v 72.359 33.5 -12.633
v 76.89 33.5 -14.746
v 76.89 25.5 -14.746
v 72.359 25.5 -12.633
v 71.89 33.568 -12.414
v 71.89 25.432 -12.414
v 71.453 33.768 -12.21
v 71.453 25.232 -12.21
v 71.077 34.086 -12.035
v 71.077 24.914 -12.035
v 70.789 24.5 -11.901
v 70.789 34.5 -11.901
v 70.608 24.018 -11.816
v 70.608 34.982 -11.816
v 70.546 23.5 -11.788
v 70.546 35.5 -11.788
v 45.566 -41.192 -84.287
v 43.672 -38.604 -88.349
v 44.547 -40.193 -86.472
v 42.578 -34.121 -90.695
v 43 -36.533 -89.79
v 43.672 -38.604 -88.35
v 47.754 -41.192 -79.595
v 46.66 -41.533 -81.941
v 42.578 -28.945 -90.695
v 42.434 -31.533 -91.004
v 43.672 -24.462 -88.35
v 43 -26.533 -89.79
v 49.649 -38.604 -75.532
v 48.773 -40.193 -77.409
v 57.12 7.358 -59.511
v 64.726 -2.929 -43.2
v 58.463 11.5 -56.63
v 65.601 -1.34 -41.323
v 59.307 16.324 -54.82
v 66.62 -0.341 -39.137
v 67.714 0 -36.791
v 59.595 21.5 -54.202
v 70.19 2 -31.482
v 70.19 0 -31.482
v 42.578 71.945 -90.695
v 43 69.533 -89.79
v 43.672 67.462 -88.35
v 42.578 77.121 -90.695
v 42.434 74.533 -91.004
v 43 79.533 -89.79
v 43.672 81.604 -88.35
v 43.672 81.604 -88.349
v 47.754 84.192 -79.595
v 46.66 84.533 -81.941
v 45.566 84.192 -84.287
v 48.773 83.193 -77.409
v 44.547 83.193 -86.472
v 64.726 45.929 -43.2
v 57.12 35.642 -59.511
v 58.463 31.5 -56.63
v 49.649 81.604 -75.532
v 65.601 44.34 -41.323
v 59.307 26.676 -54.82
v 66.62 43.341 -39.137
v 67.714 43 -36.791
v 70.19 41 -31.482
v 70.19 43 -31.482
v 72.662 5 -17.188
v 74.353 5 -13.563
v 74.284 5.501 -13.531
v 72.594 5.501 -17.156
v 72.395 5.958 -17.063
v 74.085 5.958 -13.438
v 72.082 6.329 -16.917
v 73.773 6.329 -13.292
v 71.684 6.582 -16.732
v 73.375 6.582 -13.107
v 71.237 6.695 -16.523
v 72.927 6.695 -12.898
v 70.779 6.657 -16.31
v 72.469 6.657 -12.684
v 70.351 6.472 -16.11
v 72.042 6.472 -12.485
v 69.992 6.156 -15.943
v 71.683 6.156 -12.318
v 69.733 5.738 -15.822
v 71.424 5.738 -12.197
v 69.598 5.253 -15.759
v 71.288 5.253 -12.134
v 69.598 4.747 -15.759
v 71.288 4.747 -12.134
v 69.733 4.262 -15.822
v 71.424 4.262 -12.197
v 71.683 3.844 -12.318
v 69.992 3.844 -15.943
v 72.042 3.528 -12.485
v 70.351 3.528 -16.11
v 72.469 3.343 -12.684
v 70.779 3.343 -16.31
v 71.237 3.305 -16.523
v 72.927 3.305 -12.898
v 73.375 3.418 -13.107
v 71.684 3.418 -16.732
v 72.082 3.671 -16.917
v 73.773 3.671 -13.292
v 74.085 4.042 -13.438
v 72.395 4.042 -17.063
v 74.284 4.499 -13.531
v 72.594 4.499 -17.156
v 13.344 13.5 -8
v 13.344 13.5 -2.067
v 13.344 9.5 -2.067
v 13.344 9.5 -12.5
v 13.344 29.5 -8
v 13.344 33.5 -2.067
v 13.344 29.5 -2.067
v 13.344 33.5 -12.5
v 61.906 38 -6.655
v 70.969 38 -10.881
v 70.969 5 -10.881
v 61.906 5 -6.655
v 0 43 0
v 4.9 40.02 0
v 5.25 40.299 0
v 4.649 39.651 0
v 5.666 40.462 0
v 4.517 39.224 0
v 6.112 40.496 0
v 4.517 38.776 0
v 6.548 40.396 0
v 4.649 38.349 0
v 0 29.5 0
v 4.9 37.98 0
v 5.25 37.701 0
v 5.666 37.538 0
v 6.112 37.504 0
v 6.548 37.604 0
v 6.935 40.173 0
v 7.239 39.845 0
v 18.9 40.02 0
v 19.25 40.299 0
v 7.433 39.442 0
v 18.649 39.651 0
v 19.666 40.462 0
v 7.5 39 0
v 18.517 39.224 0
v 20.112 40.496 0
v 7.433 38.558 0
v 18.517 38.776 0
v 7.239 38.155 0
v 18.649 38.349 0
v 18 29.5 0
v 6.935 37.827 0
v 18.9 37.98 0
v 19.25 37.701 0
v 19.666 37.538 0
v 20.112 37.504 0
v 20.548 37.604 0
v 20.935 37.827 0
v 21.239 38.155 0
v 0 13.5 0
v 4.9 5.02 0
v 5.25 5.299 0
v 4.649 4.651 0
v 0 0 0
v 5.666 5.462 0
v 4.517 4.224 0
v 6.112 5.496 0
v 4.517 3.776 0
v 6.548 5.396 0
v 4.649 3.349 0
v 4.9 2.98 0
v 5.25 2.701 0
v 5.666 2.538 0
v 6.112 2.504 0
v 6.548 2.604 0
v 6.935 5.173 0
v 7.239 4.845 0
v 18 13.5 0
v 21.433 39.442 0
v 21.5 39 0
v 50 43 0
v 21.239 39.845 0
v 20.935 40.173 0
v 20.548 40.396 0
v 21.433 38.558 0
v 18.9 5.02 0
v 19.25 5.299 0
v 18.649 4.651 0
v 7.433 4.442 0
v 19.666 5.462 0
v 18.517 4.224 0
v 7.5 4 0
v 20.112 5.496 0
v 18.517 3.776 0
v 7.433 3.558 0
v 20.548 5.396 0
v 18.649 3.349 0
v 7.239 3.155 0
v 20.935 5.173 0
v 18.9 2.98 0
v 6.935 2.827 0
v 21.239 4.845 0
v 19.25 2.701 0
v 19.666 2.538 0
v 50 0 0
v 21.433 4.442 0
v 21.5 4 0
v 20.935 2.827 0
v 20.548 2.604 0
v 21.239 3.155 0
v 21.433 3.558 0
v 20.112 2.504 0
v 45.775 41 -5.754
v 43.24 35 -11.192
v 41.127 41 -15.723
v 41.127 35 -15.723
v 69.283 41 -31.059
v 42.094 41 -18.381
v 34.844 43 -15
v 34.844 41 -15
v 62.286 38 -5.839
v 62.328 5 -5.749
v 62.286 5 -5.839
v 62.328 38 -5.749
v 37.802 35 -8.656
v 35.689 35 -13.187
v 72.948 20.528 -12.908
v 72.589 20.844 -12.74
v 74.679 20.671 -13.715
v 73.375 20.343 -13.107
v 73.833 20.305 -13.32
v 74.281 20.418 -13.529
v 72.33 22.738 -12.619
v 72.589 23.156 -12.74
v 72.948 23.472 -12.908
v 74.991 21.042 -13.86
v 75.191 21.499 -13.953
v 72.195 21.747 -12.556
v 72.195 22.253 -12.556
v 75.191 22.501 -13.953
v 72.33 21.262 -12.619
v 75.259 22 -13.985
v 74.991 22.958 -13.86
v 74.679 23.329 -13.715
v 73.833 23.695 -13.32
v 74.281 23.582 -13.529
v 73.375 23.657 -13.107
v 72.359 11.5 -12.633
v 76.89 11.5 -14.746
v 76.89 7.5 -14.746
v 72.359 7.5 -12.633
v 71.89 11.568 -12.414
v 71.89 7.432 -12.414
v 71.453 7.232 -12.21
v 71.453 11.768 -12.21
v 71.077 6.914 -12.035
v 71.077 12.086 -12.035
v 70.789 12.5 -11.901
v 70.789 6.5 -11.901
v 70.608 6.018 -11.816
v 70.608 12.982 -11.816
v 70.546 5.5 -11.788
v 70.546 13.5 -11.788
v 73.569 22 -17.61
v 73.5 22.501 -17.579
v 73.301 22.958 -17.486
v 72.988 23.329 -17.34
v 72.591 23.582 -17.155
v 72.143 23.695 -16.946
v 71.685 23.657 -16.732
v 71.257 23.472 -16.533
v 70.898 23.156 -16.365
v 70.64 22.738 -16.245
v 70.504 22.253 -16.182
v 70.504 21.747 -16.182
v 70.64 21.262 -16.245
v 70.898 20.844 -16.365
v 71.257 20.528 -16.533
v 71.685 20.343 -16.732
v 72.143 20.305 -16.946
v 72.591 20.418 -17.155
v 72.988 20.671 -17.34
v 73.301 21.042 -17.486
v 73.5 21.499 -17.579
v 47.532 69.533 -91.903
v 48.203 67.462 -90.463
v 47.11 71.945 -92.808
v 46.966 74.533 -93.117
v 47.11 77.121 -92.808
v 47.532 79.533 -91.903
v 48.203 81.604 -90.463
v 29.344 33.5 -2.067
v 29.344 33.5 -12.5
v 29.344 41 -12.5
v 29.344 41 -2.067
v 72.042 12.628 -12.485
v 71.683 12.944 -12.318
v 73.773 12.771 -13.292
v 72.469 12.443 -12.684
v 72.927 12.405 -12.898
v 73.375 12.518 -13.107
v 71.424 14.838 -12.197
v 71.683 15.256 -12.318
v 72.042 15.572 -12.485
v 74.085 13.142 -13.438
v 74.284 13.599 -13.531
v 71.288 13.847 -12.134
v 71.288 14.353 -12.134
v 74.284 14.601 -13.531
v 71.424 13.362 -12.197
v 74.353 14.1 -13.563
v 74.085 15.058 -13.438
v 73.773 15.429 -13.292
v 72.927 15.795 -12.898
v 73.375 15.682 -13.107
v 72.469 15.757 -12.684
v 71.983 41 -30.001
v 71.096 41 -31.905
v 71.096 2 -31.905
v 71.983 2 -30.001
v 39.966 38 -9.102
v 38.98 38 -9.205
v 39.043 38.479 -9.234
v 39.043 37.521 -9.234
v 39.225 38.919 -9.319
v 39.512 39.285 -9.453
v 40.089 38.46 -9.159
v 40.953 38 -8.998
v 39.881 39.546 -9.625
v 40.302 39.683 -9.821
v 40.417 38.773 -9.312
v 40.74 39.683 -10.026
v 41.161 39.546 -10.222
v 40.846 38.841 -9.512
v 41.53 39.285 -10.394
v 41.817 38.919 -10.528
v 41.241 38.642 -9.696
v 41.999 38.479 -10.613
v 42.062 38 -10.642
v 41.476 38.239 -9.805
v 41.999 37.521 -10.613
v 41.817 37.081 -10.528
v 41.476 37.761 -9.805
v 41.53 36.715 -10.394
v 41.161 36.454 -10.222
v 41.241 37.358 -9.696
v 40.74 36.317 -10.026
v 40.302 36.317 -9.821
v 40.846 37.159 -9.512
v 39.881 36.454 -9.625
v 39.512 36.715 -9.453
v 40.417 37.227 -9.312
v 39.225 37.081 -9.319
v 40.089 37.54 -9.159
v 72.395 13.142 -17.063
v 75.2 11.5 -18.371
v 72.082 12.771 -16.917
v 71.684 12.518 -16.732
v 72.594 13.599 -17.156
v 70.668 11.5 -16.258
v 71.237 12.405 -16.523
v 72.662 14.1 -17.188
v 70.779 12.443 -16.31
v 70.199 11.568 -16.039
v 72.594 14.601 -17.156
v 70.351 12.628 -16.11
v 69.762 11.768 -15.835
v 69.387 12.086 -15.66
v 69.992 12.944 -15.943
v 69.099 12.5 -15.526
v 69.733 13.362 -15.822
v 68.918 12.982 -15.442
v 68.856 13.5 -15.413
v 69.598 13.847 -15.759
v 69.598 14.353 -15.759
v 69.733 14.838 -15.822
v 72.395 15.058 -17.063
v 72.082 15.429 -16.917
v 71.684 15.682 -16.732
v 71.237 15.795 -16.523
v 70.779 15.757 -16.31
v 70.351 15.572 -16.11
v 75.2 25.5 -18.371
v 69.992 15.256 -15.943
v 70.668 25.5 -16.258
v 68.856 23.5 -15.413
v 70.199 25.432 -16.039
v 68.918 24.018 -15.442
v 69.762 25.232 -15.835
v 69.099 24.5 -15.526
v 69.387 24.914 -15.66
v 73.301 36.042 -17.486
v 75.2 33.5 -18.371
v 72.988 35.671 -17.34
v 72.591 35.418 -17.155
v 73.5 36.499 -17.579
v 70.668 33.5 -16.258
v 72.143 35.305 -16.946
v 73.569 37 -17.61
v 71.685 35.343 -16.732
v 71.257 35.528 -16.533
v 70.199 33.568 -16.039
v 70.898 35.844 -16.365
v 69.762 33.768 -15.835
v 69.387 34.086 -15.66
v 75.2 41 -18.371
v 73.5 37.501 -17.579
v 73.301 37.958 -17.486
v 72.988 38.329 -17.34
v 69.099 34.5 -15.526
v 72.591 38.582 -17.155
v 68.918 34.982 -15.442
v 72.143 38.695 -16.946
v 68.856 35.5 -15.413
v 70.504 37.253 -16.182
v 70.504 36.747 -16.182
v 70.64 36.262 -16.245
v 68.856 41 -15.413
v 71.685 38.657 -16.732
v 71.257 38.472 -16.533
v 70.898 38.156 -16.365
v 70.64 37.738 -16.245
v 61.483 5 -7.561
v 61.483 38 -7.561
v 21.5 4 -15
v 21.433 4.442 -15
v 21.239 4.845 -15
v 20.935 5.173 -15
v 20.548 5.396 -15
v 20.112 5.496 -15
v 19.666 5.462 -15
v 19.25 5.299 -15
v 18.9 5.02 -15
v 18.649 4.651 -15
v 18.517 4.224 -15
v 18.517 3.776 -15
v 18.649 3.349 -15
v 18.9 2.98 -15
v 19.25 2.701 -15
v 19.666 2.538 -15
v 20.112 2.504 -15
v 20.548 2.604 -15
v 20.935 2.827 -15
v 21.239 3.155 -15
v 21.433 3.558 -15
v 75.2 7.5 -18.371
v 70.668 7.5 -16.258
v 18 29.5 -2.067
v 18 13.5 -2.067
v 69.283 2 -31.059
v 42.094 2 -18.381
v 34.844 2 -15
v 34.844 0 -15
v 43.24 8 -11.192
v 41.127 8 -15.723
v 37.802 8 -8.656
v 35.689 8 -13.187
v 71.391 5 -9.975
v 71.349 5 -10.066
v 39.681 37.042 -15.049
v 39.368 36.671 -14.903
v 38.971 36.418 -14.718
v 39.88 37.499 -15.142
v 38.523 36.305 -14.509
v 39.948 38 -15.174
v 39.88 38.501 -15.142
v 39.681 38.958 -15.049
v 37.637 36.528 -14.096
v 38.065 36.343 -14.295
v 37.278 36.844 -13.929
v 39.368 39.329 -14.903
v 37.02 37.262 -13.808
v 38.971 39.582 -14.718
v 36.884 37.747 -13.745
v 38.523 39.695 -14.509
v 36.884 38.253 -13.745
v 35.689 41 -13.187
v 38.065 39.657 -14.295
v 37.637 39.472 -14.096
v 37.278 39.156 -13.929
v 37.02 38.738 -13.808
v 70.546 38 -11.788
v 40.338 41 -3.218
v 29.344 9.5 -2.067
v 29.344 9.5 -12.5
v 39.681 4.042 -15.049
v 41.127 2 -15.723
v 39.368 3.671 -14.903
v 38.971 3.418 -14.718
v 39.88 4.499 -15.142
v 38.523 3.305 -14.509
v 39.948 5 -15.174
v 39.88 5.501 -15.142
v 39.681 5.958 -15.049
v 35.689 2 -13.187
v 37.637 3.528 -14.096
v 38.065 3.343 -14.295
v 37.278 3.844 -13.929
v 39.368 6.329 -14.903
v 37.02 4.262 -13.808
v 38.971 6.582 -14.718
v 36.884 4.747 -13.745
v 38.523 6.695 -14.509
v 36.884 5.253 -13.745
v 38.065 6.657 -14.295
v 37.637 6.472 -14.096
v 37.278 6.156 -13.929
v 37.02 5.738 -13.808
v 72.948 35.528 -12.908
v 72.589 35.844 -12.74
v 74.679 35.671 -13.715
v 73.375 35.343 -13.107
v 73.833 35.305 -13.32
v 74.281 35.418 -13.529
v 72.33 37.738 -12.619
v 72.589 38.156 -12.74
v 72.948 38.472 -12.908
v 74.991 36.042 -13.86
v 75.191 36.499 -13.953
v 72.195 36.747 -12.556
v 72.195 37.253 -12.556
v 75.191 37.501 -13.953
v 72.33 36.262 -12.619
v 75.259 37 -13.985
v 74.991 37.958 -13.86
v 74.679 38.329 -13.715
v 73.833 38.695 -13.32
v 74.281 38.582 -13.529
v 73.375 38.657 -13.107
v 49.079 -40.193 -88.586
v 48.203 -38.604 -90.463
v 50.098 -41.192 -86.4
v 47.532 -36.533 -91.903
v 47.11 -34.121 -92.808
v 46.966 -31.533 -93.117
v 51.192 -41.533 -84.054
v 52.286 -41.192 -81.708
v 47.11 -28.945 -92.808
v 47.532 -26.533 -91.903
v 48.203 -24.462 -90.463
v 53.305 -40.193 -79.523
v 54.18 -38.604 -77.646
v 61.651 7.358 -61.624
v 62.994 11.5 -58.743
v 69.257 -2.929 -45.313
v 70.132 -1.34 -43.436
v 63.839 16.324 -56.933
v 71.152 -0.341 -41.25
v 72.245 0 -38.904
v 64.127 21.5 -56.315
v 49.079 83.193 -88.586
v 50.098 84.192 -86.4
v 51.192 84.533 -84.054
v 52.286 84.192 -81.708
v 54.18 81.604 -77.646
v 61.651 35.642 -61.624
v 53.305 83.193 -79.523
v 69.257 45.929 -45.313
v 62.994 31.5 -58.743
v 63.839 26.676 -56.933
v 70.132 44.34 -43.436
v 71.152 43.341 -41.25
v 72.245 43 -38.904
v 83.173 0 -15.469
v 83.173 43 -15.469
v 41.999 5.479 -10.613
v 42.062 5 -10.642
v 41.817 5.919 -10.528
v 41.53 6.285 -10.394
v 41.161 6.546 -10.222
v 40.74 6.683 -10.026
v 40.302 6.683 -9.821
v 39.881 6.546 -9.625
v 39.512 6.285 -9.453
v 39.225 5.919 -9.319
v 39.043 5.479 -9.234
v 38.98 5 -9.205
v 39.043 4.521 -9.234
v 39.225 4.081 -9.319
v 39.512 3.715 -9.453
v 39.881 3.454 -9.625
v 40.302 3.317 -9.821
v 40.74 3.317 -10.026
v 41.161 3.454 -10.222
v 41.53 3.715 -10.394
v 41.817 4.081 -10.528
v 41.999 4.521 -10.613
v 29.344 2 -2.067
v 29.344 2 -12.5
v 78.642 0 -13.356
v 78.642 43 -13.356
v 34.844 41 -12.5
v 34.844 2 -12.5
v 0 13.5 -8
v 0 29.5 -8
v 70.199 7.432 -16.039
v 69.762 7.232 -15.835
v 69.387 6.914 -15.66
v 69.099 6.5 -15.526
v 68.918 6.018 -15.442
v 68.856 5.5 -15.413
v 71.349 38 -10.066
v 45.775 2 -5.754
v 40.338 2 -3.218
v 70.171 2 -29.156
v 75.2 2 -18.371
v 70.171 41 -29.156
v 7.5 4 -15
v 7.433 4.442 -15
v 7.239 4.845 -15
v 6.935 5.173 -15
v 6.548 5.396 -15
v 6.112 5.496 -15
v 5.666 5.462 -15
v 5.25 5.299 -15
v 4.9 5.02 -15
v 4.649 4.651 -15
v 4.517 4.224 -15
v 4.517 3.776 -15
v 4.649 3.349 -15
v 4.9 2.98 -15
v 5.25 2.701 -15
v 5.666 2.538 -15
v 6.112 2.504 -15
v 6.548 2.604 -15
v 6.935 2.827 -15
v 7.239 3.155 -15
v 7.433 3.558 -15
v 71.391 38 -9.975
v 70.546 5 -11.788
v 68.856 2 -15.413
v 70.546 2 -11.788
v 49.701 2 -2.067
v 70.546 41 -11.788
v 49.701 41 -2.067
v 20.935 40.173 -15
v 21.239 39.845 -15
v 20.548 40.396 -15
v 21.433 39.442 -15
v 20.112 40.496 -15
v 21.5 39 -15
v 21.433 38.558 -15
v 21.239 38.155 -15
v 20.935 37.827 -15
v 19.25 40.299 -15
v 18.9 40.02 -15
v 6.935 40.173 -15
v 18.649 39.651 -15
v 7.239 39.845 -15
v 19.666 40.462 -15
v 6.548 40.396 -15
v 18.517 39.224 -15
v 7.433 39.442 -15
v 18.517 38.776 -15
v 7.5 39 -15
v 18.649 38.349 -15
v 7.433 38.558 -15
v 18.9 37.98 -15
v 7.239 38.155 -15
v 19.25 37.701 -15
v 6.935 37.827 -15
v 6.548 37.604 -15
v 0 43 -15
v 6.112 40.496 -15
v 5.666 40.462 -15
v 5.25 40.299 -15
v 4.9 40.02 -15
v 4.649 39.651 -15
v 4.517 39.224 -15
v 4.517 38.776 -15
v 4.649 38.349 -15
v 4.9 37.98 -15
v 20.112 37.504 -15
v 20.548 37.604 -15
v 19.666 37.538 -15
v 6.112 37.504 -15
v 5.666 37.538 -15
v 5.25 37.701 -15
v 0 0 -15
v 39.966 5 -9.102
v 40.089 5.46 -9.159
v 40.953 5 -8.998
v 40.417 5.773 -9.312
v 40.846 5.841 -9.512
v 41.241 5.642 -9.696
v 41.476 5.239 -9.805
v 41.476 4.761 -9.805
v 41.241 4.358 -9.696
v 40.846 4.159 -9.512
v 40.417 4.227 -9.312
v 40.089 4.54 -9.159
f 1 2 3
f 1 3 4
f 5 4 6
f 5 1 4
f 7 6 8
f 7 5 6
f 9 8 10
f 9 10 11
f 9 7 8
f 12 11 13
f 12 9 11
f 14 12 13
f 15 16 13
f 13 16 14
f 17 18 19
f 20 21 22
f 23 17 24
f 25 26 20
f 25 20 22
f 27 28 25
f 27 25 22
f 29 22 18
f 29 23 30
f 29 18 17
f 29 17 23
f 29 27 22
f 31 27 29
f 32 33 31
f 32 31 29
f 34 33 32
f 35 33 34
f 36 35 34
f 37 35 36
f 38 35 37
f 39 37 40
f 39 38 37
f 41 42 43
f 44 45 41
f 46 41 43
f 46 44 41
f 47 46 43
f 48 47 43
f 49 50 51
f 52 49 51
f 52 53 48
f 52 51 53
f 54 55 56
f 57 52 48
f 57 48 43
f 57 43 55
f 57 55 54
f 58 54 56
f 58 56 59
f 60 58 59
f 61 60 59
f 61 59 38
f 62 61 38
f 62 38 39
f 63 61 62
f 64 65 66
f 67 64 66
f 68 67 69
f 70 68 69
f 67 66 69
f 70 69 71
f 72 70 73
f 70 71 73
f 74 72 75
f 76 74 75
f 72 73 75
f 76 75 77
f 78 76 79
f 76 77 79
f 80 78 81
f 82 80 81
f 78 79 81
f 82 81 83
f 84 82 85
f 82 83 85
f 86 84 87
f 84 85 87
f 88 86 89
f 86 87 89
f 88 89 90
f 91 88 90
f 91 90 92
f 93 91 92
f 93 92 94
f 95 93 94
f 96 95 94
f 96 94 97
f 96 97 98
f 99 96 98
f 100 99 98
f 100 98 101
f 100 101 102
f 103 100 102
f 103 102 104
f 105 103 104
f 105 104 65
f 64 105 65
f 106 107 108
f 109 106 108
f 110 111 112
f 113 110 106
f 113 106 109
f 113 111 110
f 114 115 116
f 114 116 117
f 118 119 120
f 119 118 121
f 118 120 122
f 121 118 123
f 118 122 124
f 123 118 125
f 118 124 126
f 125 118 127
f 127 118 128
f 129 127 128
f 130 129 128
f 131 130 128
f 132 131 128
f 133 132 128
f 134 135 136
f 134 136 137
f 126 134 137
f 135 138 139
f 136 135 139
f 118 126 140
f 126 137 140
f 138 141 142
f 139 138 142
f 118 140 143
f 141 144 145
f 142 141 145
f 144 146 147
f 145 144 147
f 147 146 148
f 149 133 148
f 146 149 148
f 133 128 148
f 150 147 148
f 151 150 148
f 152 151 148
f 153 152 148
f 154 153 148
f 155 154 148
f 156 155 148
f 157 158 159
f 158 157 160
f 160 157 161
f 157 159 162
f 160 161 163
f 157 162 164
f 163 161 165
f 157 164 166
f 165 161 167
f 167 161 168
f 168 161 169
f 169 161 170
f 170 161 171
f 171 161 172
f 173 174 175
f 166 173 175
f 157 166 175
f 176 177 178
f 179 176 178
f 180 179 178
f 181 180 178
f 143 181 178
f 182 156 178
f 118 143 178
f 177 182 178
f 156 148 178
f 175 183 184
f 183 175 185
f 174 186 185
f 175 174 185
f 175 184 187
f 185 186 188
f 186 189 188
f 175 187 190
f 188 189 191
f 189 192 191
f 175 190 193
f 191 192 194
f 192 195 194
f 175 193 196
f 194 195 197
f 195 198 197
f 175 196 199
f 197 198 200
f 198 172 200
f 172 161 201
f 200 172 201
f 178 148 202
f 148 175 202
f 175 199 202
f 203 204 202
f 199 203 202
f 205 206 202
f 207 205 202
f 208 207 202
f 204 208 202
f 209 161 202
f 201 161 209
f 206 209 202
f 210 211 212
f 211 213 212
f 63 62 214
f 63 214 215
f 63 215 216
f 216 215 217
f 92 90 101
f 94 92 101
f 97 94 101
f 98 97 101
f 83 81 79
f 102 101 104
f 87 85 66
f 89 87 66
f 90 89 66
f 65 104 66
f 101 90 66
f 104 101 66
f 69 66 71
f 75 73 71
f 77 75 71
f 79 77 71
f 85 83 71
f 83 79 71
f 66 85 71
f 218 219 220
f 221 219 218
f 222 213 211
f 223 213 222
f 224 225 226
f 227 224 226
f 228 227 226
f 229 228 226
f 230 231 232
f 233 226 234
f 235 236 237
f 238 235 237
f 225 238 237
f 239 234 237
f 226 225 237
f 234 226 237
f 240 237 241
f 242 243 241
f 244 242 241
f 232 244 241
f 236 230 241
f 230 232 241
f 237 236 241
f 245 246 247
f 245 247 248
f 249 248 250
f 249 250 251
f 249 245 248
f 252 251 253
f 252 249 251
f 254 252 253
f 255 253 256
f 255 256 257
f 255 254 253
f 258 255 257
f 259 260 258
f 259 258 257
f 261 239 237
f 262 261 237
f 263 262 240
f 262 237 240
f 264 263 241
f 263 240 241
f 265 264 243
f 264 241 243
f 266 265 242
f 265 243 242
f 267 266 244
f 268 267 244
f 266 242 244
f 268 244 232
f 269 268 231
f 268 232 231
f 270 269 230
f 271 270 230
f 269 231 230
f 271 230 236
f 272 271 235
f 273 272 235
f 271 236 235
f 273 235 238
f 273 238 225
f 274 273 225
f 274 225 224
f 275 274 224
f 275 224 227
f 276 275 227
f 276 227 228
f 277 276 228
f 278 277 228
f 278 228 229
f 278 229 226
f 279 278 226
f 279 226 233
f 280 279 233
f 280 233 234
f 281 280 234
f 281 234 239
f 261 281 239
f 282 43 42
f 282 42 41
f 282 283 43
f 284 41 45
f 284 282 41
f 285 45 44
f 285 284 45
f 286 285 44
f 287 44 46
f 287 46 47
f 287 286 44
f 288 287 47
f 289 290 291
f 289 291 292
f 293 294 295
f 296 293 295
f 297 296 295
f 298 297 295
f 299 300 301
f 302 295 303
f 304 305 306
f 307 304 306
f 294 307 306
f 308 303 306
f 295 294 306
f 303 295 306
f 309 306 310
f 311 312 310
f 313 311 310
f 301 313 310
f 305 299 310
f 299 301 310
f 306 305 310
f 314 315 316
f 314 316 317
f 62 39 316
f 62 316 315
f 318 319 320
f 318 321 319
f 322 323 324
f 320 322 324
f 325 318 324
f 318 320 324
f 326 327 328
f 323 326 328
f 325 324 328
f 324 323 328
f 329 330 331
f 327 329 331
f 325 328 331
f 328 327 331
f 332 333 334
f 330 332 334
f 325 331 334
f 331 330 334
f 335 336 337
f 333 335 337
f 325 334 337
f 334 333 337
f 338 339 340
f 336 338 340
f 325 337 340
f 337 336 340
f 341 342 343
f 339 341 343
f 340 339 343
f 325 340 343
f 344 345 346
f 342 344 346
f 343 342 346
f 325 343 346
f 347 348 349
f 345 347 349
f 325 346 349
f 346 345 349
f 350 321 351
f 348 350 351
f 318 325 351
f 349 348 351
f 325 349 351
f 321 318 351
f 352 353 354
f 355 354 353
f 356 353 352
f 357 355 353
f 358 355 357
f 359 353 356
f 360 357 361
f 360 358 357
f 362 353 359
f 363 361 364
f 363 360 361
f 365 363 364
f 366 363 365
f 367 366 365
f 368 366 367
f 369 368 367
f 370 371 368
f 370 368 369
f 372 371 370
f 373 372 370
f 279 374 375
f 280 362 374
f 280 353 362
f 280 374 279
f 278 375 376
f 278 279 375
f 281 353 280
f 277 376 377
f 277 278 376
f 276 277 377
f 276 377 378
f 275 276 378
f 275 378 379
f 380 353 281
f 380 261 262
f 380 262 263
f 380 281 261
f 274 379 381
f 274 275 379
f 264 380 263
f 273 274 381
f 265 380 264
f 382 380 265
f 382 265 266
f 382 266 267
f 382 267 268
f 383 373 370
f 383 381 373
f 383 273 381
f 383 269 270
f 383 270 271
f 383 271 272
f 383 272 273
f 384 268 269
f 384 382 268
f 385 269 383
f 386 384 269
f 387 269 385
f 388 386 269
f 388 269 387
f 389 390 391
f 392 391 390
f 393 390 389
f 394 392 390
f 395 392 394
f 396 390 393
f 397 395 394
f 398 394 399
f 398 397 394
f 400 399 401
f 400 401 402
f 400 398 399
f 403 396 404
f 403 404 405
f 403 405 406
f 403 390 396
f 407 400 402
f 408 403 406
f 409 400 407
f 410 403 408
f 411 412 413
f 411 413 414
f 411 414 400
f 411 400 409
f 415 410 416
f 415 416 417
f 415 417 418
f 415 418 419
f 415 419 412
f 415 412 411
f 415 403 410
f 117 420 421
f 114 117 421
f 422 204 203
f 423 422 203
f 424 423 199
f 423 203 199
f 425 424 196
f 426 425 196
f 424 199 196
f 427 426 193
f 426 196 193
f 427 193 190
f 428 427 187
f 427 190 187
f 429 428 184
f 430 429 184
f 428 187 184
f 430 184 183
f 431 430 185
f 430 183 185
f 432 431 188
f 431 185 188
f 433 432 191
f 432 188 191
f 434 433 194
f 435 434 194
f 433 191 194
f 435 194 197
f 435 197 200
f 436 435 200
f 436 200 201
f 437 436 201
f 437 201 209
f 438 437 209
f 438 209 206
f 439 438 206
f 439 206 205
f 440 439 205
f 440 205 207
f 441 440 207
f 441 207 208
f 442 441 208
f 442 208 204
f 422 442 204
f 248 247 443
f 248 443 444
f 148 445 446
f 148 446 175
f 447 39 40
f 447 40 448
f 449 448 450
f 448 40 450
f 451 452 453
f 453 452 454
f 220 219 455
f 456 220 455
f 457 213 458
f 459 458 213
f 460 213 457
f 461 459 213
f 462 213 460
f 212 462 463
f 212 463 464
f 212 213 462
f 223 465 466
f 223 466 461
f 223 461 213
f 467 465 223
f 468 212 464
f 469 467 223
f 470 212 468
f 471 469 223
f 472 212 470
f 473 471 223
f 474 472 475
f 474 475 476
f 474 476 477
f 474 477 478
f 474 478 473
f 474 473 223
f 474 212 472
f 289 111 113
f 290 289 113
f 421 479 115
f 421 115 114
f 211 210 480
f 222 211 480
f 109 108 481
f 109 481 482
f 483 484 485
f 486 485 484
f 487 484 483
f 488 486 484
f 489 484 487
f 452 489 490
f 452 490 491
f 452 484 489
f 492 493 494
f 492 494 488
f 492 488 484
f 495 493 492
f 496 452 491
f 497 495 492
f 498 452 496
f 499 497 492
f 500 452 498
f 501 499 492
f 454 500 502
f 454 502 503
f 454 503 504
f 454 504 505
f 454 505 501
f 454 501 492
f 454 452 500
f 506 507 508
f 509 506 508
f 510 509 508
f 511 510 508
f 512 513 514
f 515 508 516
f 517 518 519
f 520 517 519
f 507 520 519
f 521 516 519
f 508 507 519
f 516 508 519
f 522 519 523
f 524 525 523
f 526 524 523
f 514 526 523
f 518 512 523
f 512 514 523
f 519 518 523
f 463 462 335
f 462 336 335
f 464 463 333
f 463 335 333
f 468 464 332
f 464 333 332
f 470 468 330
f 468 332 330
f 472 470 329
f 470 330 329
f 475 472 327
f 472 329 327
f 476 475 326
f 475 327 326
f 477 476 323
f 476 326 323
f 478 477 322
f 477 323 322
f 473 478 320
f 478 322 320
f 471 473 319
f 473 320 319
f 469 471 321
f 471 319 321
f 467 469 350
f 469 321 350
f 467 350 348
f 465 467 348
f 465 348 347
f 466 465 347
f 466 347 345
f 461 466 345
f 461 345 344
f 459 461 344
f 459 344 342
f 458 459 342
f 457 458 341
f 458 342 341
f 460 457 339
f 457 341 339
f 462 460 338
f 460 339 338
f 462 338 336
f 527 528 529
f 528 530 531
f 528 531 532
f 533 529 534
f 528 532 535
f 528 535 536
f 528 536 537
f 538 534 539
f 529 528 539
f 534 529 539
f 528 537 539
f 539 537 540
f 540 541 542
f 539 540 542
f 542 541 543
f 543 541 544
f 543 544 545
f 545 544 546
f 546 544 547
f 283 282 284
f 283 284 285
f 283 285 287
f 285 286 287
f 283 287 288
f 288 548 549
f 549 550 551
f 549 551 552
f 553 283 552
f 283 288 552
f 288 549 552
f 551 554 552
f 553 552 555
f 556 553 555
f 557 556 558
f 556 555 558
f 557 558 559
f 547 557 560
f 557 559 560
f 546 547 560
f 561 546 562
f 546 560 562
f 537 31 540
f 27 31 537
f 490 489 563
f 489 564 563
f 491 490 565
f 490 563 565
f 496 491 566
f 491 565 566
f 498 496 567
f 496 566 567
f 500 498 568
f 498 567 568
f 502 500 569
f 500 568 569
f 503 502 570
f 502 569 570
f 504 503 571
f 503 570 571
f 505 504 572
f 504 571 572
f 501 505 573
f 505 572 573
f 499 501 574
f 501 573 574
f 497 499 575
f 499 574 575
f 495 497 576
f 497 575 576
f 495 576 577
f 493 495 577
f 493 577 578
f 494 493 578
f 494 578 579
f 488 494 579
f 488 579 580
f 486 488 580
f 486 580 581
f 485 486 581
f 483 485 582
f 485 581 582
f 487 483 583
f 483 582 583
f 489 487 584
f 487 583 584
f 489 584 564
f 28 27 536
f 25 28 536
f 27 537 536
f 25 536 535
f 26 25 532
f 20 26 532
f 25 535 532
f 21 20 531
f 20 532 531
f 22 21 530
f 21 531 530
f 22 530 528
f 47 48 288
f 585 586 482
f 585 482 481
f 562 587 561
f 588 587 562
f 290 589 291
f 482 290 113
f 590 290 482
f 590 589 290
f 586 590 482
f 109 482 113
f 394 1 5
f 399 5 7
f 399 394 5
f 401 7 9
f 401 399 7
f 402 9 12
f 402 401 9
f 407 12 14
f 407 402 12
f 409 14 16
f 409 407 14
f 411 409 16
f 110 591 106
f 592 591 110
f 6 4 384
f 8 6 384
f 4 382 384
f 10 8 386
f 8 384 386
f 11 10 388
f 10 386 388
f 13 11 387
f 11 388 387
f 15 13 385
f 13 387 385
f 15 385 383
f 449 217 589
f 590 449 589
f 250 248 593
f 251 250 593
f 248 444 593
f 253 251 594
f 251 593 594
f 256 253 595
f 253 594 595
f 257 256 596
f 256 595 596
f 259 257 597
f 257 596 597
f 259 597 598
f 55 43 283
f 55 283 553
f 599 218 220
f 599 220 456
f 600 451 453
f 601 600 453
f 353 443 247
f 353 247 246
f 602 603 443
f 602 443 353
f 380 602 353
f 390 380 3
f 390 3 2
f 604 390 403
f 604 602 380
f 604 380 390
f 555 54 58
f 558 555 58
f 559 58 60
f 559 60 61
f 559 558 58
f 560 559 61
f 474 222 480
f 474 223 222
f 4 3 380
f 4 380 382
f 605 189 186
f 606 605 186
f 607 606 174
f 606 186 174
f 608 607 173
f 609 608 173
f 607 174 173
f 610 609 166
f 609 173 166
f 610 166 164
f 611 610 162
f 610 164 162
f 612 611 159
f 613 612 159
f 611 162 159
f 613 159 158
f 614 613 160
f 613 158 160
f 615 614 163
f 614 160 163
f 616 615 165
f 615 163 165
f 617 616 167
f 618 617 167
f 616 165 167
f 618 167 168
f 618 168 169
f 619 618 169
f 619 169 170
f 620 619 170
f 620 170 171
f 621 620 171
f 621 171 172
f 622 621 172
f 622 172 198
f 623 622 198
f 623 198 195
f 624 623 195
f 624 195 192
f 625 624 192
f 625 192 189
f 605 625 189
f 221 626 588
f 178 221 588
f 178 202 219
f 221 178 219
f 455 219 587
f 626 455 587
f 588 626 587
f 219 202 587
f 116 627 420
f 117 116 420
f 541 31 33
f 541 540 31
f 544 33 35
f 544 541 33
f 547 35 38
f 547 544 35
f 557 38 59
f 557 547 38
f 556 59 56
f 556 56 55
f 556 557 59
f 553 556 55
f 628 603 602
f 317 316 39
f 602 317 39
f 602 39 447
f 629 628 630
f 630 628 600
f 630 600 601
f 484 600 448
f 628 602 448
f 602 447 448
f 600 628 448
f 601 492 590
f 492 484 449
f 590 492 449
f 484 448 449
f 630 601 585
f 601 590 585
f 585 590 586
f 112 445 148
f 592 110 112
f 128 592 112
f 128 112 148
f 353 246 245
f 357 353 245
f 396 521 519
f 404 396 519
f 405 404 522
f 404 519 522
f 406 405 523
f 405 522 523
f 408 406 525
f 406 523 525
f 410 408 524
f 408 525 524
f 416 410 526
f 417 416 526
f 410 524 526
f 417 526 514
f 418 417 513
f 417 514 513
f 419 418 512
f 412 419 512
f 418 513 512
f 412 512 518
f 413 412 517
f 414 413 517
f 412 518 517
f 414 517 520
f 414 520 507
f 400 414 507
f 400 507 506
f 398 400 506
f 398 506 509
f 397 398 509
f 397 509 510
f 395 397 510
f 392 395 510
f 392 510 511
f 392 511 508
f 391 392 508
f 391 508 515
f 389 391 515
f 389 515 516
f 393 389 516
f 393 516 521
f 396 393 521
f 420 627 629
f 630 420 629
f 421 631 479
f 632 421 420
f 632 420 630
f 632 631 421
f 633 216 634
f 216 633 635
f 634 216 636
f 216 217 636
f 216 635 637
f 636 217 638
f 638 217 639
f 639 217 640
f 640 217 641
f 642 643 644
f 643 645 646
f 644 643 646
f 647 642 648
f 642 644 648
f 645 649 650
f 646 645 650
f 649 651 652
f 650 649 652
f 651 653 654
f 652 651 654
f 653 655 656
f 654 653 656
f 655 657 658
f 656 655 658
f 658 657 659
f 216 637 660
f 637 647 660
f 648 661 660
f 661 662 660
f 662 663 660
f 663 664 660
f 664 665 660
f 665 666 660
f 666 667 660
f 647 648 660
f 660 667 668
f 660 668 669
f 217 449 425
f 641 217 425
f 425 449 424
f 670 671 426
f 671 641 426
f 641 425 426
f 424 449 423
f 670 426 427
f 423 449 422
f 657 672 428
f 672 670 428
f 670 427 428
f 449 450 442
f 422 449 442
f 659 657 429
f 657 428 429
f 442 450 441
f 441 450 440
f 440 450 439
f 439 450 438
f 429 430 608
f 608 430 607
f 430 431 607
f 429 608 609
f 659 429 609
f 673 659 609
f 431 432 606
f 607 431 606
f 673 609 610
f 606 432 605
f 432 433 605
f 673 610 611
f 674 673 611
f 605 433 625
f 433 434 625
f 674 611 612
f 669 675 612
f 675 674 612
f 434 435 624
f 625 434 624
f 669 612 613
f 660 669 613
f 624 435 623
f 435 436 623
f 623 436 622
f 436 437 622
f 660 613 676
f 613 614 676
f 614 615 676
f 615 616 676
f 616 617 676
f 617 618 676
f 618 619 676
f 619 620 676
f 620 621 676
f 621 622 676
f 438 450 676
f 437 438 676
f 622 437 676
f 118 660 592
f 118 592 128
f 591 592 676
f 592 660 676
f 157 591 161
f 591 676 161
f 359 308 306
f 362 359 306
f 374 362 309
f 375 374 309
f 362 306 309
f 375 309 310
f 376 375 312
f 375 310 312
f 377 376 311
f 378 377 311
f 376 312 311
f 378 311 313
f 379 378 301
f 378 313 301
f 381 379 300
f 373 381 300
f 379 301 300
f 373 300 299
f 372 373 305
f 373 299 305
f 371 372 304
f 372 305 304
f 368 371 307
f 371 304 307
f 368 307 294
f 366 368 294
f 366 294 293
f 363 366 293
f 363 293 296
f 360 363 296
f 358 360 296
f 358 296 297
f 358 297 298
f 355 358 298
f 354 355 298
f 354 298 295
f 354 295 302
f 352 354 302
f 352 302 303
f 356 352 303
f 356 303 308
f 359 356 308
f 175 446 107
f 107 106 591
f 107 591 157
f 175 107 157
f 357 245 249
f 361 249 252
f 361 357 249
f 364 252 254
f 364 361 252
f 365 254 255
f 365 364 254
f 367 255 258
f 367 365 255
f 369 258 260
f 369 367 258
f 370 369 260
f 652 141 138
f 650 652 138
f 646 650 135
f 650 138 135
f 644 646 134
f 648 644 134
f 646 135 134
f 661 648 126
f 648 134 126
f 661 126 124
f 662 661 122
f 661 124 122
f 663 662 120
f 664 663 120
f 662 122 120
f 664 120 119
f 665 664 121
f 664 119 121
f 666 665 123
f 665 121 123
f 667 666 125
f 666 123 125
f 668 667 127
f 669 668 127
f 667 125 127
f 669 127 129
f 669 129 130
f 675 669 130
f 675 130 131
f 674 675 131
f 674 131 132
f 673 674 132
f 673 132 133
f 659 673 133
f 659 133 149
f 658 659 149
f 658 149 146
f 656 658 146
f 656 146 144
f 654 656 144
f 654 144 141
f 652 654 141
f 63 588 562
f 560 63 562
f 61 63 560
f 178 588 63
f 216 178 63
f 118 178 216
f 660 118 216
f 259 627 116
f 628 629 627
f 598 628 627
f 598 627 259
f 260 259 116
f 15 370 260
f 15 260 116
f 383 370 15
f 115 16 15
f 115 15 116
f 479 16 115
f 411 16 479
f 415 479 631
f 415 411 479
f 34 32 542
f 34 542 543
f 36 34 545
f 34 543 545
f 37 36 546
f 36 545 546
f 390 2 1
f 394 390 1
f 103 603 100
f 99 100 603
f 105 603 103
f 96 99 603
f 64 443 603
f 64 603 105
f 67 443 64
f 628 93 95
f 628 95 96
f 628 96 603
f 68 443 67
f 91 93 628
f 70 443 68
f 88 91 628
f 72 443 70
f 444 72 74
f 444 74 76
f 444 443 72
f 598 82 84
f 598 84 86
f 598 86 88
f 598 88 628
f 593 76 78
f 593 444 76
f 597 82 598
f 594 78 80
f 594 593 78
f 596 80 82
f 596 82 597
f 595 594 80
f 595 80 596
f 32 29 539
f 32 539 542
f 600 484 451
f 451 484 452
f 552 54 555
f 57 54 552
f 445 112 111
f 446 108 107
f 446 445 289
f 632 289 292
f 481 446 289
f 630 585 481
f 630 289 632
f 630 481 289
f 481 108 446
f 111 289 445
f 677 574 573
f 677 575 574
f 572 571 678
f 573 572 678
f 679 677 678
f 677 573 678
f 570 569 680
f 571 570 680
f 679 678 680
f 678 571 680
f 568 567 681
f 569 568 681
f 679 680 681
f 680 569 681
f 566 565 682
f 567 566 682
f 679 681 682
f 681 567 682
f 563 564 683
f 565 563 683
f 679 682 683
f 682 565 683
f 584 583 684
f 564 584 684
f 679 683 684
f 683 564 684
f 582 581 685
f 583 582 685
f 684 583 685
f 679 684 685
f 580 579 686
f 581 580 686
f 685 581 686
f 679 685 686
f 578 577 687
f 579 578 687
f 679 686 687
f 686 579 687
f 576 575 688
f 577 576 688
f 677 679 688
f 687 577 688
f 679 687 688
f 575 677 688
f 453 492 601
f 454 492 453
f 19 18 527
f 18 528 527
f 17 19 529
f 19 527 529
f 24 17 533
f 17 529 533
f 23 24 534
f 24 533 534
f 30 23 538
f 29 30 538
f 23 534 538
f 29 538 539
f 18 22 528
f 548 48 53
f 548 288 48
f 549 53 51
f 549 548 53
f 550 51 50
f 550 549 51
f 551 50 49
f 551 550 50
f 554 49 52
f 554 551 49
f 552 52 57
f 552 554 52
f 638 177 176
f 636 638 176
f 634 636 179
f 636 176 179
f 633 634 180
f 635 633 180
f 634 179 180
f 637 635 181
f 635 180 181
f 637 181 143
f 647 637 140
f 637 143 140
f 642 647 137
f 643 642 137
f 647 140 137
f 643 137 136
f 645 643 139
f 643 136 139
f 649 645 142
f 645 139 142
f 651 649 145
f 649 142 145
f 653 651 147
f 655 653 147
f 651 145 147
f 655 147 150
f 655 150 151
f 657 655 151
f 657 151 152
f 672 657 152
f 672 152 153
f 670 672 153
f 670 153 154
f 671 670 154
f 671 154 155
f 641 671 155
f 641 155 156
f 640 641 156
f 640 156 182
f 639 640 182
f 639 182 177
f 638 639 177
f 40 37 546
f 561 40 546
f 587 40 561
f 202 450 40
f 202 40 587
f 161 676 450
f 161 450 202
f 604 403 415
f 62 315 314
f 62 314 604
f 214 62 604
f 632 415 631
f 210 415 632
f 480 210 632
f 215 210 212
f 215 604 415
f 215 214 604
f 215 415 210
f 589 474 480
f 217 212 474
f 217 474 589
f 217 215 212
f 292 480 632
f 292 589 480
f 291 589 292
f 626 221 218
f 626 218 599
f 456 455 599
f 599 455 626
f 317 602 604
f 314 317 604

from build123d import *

# Parameters (mm, degrees)
AUFSATZ_LINEAR_AUSTRAGEN1_DEPTH      = 43
AUFSATZ_LINEAR_AUSTRAGEN2_DEPTH      = 5
SCHNITT_LINEAR_AUSTRAGEN1_REACH      = 157.451
SKIZZE3_R                            = 1.5
SKIZZE4_W                            = 8
SKIZZE4_H                            = 16
SCHNITT_LINEAR_AUSTRAGEN2_DEPTH      = 18
SKIZZE5_W                            = 30
SKIZZE5_H                            = 39
SCHNITT_LINEAR_AUSTRAGEN3_DEPTH      = 18
SKIZZE6_W                            = 7
SKIZZE6_H                            = 7.5
SKIZZE6_H_2                          = 14
SKIZZE6_H_3                          = 5.5
AUFSATZ_LINEAR_AUSTRAGEN3_DEPTH      = 4
VERRUNDUNG1_R                        = 2
F_3_4_3_4_DURCHMESSER_BOHRUNG1_D     = 3.4
F_3_4_3_4_DURCHMESSER_BOHRUNG1_DEPTH = 4
SKIZZE10_W                           = 10
SKIZZE10_H                           = 33
SCHNITT_LINEAR_AUSTRAGEN4_DEPTH      = 1
SKIZZE11_W                           = 10
SKIZZE11_H                           = 33
SCHNITT_LINEAR_AUSTRAGEN5_DEPTH      = 0.1
SCHNITT_LINEAR_AUSTRAGEN7_DEPTH      = 39
SKIZZE15_W                           = 10.432594073
SKIZZE15_H                           = 24
SCHNITT_LINEAR_AUSTRAGEN10_DEPTH     = 16
SKIZZE16_W                           = 2.1
SKIZZE16_H                           = 39
SCHNITT_LINEAR_AUSTRAGEN11_DEPTH     = 2
VERRUNDUNG2_R                        = 20
VERRUNDUNG3_R                        = 10
SKIZZE17_W                           = 6
SKIZZE17_H                           = 6
AUFSATZ_LINEAR_AUSTRAGEN4_DEPTH      = 5
FASE1_SIZE                           = 6
F_3_4_3_4_DURCHMESSER_BOHRUNG2_D     = 3.4
F_3_4_3_4_DURCHMESSER_BOHRUNG2_DEPTH = 5
F_3_4_3_4_DURCHMESSER_BOHRUNG2_TIP   = 1.021463052


with BuildPart() as part:
    # Skizze1 → Aufsatz-Linear austragen1 (new body)
    with BuildSketch(Plane(origin=(0, 0, 0), x_dir=(1, 0, 0), z_dir=(0, 1, 0))):
        Polygon((0, 0), (50, 0), (78.641941074, 13.355956467), (70.189575839, 31.482112208), (34.843572145, 15), (0, 15), align=None)
    extrude(amount=AUFSATZ_LINEAR_AUSTRAGEN1_DEPTH)

    # Skizze2 → Aufsatz-Linear austragen2 (add)
    with BuildSketch(Plane(origin=(69.711631316, 0, -32.507067545), x_dir=(-0.4226182617407004, 0, -0.9063077870366495), z_dir=(0.9063077870366495, 0, -0.4226182617407004))):
        Polygon((-21.130913087, 43), (8.869086913, 43), (54.544231126, 88.675144213), (68.686366749, 74.533008589), (15.65335816, 21.5), (68.686366749, -31.533008589), (54.544231126, -45.675144213), (8.869086913, 0), (-21.130913087, 0), align=None)
    extrude(amount=AUFSATZ_LINEAR_AUSTRAGEN2_DEPTH)

    # Skizze3 → Schnitt-Linear austragen1 (cut, up to next)
    with BuildSketch(Plane.XY, mode=Mode.PRIVATE) as schnitt_linear_austragen1_sk1:
        with Locations((6, 39)):
            Circle(SKIZZE3_R)
    schnitt_linear_austragen1_tool1 = extrude(schnitt_linear_austragen1_sk1.sketch, amount=-SCHNITT_LINEAR_AUSTRAGEN1_REACH, mode=Mode.PRIVATE) & part.part
    # Skizze3 → Schnitt-Linear austragen1 (cut, up to next)
    with BuildSketch(Plane.XY, mode=Mode.PRIVATE) as schnitt_linear_austragen1_sk2:
        with Locations((20, 39)):
            Circle(SKIZZE3_R)
    schnitt_linear_austragen1_tool2 = extrude(schnitt_linear_austragen1_sk2.sketch, amount=-SCHNITT_LINEAR_AUSTRAGEN1_REACH, mode=Mode.PRIVATE) & part.part
    # Skizze3 → Schnitt-Linear austragen1 (cut, up to next)
    with BuildSketch(Plane.XY, mode=Mode.PRIVATE) as schnitt_linear_austragen1_sk3:
        with Locations((6, 4)):
            Circle(SKIZZE3_R)
    schnitt_linear_austragen1_tool3 = extrude(schnitt_linear_austragen1_sk3.sketch, amount=-SCHNITT_LINEAR_AUSTRAGEN1_REACH, mode=Mode.PRIVATE) & part.part
    # Skizze3 → Schnitt-Linear austragen1 (cut, up to next)
    with BuildSketch(Plane.XY, mode=Mode.PRIVATE) as schnitt_linear_austragen1_sk4:
        with Locations((20, 4)):
            Circle(SKIZZE3_R)
    schnitt_linear_austragen1_tool4 = extrude(schnitt_linear_austragen1_sk4.sketch, amount=-SCHNITT_LINEAR_AUSTRAGEN1_REACH, mode=Mode.PRIVATE) & part.part
    add(schnitt_linear_austragen1_tool1.solids().sort_by_distance((6, 39, 0))[0], mode=Mode.SUBTRACT)
    add(schnitt_linear_austragen1_tool2.solids().sort_by_distance((20, 39, 0))[0], mode=Mode.SUBTRACT)
    add(schnitt_linear_austragen1_tool3.solids().sort_by_distance((6, 4, 0))[0], mode=Mode.SUBTRACT)
    add(schnitt_linear_austragen1_tool4.solids().sort_by_distance((20, 4, 0))[0], mode=Mode.SUBTRACT)

    # Skizze4 → Schnitt-Linear austragen2 (cut)
    with BuildSketch(Plane.ZY):
        with Locations((-4, 21.5)):
            Rectangle(SKIZZE4_W, SKIZZE4_H)
    extrude(amount=-SCHNITT_LINEAR_AUSTRAGEN2_DEPTH, mode=Mode.SUBTRACT)

    # Skizze5 → Schnitt-Linear austragen3 (cut)
    with BuildSketch(Plane(origin=(0.477944523, 0, 1.024955337), x_dir=(-0.9063077870366492, 0, 0.4226182617407011), z_dir=(-0.4226182617407011, 0, -0.9063077870366492))):
        with Locations((-60.918274689, 21.5)):
            Rectangle(SKIZZE5_W, SKIZZE5_H)
    extrude(amount=-SCHNITT_LINEAR_AUSTRAGEN3_DEPTH, mode=Mode.SUBTRACT)

    # Skizze6 → Aufsatz-Linear austragen3 (add)
    with BuildSketch(Plane(origin=(8.085073234, 0, 17.338495504), x_dir=(-0.9063077870366492, 0, 0.42261826174070133), z_dir=(-0.42261826174070133, 0, -0.9063077870366492))):
        with Locations((-72.418274689, 37.25)):
            Rectangle(SKIZZE6_W, SKIZZE6_H)
        with Locations((-72.418274689, 18.5)):
            Rectangle(SKIZZE6_W, SKIZZE6_H_2)
        with Locations((-72.418274689, 4.75)):
            Rectangle(SKIZZE6_W, SKIZZE6_H_3)
    extrude(amount=AUFSATZ_LINEAR_AUSTRAGEN3_DEPTH)

    # Verrundung1
    verrundung1_edges = [part.edges().sort_by_distance(p)[0] for p in [
        (69.701005731, 33.5, -13.600241521),
        (69.701005731, 11.5, -13.600241521),
        (69.701005731, 25.5, -13.600241521),
        (69.701005731, 7.5, -13.600241521),
    ]]
    fillet(verrundung1_edges, radius=VERRUNDUNG1_R)

    # Ø3.4 (3.4) Durchmesser Bohrung1
    with Locations(Plane(origin=(6.394600187, 0, 13.713264356), x_dir=(-0.906307787036649, 0, 0.4226182617407016), z_dir=(-0.4226182617407016, 0, -0.906307787036649))):
        with Locations((-72.418274689, 37), (-72.418274689, 22), (-71.418274689, 14.1), (-71.418274689, 5)):
            Hole(F_3_4_3_4_DURCHMESSER_BOHRUNG1_D / 2, depth=F_3_4_3_4_DURCHMESSER_BOHRUNG1_DEPTH)

    # Skizze10 → Schnitt-Linear austragen4 (cut)
    with BuildSketch(Plane(origin=(8.085073234, 0, 17.338495504), x_dir=(-0.9063077870366492, 0, 0.42261826174070133), z_dir=(-0.42261826174070133, 0, -0.9063077870366492))):
        with Locations((-63.918274689, 21.5)):
            Rectangle(SKIZZE10_W, SKIZZE10_H)
    extrude(amount=-SCHNITT_LINEAR_AUSTRAGEN4_DEPTH, mode=Mode.SUBTRACT)

    # Skizze11 → Schnitt-Linear austragen5 (cut)
    with BuildSketch(Plane(origin=(8.930309758, 0, 19.151111078), x_dir=(0.9063077870366492, 0, -0.42261826174070133), z_dir=(0.42261826174070133, 0, 0.9063077870366492))):
        with Locations((63.918274689, 21.5)):
            Rectangle(SKIZZE11_W, SKIZZE11_H)
    extrude(amount=-SCHNITT_LINEAR_AUSTRAGEN5_DEPTH, mode=Mode.SUBTRACT)

    # Skizze12 → Schnitt-Linear austragen7 (cut)
    with BuildSketch(Plane(origin=(0, 2, 0), x_dir=(1, 0, 0), z_dir=(0, 1, 0))):
        Polygon((49.701163152, 2.067405927), (42.094034441, 18.380946094), (34.843572145, 15), (34.843572145, 12.5), (29.343572145, 12.5), (29.343572145, 2.067405927), align=None)
    extrude(amount=SCHNITT_LINEAR_AUSTRAGEN7_DEPTH, mode=Mode.SUBTRACT)

    # Skizze15 → Schnitt-Linear austragen10 (cut)
    with BuildSketch(Plane(origin=(29.343572145, 0, 0), x_dir=(0, 0, -1), z_dir=(1, 0, 0))):
        with Locations((7.283702963, 21.5)):
            Rectangle(SKIZZE15_W, SKIZZE15_H)
    extrude(amount=-SCHNITT_LINEAR_AUSTRAGEN10_DEPTH, mode=Mode.SUBTRACT)

    # Skizze16 → Schnitt-Linear austragen11 (cut)
    with BuildSketch(Plane(origin=(68.805323529, 0, -32.084449283), x_dir=(0.42261826174070133, 0, 0.9063077870366492), z_dir=(-0.9063077870366492, 0, 0.42261826174070133))):
        with Locations((2.180913087, 21.5)):
            Rectangle(SKIZZE16_W, SKIZZE16_H)
    extrude(amount=-SCHNITT_LINEAR_AUSTRAGEN11_DEPTH, mode=Mode.SUBTRACT)

    # Verrundung2
    verrundung2_edges = [part.edges().sort_by_distance(p)[0] for p in [
        (65.362005767, 21.5, -47.750373594),
    ]]
    fillet(verrundung2_edges, radius=VERRUNDUNG2_R)

    # Verrundung3
    verrundung3_edges = [part.edges().sort_by_distance(p)[0] for p in [
        (68.229162689, 43, -41.601735733),
        (68.229162689, 0, -41.601735733),
        (42.949287863, 74.533008589, -95.814602248),
        (48.926012637, 88.675144213, -82.997474607),
        (48.926012637, -45.675144213, -82.997474607),
        (42.949287863, -31.533008589, -95.814602248),
    ]]
    fillet(verrundung3_edges, radius=VERRUNDUNG3_R - 0.0001)  # a hair under: the kernel refuses the full size

    # Skizze17 → Aufsatz-Linear austragen4 (add)
    with BuildSketch(Plane(origin=(1.323181047, 0, 2.837570911), x_dir=(-0.9063077870366492, 0, 0.4226182617407011), z_dir=(-0.4226182617407011, 0, -0.9063077870366492))):
        with Locations((-40.918274689, 38)):
            Rectangle(SKIZZE17_W, SKIZZE17_H)
        with Locations((-40.918274689, 5)):
            Rectangle(SKIZZE17_W, SKIZZE17_H)
    extrude(amount=-AUFSATZ_LINEAR_AUSTRAGEN4_DEPTH)

    # Fase1
    fase1_edges = [part.edges().sort_by_distance(p)[0] for p in [
        (40.520823338, 2, -9.923700276),
        (40.520823338, 41, -9.923700276),
    ]]
    chamfer(fase1_edges, length=FASE1_SIZE - 0.0001)  # a hair under: the kernel refuses the full size

    # Ø3.4 (3.4) Durchmesser Bohrung2
    with Locations(Plane(origin=(1.323181047, 0, 2.837570911), x_dir=(-0.9063077870366492, 0, 0.4226182617407014), z_dir=(-0.42261826174070133, 0, -0.906307787036649))):
        with Locations((-40.918274689, 38), (-40.918274689, 5)):
            Hole(F_3_4_3_4_DURCHMESSER_BOHRUNG2_D / 2, depth=F_3_4_3_4_DURCHMESSER_BOHRUNG2_DEPTH)
            with Locations((0, 0, -(F_3_4_3_4_DURCHMESSER_BOHRUNG2_DEPTH + F_3_4_3_4_DURCHMESSER_BOHRUNG2_TIP / 2))):  # 118° drill point
                Cone(0, F_3_4_3_4_DURCHMESSER_BOHRUNG2_D / 2, F_3_4_3_4_DURCHMESSER_BOHRUNG2_TIP, mode=Mode.SUBTRACT)


solid = part.part
